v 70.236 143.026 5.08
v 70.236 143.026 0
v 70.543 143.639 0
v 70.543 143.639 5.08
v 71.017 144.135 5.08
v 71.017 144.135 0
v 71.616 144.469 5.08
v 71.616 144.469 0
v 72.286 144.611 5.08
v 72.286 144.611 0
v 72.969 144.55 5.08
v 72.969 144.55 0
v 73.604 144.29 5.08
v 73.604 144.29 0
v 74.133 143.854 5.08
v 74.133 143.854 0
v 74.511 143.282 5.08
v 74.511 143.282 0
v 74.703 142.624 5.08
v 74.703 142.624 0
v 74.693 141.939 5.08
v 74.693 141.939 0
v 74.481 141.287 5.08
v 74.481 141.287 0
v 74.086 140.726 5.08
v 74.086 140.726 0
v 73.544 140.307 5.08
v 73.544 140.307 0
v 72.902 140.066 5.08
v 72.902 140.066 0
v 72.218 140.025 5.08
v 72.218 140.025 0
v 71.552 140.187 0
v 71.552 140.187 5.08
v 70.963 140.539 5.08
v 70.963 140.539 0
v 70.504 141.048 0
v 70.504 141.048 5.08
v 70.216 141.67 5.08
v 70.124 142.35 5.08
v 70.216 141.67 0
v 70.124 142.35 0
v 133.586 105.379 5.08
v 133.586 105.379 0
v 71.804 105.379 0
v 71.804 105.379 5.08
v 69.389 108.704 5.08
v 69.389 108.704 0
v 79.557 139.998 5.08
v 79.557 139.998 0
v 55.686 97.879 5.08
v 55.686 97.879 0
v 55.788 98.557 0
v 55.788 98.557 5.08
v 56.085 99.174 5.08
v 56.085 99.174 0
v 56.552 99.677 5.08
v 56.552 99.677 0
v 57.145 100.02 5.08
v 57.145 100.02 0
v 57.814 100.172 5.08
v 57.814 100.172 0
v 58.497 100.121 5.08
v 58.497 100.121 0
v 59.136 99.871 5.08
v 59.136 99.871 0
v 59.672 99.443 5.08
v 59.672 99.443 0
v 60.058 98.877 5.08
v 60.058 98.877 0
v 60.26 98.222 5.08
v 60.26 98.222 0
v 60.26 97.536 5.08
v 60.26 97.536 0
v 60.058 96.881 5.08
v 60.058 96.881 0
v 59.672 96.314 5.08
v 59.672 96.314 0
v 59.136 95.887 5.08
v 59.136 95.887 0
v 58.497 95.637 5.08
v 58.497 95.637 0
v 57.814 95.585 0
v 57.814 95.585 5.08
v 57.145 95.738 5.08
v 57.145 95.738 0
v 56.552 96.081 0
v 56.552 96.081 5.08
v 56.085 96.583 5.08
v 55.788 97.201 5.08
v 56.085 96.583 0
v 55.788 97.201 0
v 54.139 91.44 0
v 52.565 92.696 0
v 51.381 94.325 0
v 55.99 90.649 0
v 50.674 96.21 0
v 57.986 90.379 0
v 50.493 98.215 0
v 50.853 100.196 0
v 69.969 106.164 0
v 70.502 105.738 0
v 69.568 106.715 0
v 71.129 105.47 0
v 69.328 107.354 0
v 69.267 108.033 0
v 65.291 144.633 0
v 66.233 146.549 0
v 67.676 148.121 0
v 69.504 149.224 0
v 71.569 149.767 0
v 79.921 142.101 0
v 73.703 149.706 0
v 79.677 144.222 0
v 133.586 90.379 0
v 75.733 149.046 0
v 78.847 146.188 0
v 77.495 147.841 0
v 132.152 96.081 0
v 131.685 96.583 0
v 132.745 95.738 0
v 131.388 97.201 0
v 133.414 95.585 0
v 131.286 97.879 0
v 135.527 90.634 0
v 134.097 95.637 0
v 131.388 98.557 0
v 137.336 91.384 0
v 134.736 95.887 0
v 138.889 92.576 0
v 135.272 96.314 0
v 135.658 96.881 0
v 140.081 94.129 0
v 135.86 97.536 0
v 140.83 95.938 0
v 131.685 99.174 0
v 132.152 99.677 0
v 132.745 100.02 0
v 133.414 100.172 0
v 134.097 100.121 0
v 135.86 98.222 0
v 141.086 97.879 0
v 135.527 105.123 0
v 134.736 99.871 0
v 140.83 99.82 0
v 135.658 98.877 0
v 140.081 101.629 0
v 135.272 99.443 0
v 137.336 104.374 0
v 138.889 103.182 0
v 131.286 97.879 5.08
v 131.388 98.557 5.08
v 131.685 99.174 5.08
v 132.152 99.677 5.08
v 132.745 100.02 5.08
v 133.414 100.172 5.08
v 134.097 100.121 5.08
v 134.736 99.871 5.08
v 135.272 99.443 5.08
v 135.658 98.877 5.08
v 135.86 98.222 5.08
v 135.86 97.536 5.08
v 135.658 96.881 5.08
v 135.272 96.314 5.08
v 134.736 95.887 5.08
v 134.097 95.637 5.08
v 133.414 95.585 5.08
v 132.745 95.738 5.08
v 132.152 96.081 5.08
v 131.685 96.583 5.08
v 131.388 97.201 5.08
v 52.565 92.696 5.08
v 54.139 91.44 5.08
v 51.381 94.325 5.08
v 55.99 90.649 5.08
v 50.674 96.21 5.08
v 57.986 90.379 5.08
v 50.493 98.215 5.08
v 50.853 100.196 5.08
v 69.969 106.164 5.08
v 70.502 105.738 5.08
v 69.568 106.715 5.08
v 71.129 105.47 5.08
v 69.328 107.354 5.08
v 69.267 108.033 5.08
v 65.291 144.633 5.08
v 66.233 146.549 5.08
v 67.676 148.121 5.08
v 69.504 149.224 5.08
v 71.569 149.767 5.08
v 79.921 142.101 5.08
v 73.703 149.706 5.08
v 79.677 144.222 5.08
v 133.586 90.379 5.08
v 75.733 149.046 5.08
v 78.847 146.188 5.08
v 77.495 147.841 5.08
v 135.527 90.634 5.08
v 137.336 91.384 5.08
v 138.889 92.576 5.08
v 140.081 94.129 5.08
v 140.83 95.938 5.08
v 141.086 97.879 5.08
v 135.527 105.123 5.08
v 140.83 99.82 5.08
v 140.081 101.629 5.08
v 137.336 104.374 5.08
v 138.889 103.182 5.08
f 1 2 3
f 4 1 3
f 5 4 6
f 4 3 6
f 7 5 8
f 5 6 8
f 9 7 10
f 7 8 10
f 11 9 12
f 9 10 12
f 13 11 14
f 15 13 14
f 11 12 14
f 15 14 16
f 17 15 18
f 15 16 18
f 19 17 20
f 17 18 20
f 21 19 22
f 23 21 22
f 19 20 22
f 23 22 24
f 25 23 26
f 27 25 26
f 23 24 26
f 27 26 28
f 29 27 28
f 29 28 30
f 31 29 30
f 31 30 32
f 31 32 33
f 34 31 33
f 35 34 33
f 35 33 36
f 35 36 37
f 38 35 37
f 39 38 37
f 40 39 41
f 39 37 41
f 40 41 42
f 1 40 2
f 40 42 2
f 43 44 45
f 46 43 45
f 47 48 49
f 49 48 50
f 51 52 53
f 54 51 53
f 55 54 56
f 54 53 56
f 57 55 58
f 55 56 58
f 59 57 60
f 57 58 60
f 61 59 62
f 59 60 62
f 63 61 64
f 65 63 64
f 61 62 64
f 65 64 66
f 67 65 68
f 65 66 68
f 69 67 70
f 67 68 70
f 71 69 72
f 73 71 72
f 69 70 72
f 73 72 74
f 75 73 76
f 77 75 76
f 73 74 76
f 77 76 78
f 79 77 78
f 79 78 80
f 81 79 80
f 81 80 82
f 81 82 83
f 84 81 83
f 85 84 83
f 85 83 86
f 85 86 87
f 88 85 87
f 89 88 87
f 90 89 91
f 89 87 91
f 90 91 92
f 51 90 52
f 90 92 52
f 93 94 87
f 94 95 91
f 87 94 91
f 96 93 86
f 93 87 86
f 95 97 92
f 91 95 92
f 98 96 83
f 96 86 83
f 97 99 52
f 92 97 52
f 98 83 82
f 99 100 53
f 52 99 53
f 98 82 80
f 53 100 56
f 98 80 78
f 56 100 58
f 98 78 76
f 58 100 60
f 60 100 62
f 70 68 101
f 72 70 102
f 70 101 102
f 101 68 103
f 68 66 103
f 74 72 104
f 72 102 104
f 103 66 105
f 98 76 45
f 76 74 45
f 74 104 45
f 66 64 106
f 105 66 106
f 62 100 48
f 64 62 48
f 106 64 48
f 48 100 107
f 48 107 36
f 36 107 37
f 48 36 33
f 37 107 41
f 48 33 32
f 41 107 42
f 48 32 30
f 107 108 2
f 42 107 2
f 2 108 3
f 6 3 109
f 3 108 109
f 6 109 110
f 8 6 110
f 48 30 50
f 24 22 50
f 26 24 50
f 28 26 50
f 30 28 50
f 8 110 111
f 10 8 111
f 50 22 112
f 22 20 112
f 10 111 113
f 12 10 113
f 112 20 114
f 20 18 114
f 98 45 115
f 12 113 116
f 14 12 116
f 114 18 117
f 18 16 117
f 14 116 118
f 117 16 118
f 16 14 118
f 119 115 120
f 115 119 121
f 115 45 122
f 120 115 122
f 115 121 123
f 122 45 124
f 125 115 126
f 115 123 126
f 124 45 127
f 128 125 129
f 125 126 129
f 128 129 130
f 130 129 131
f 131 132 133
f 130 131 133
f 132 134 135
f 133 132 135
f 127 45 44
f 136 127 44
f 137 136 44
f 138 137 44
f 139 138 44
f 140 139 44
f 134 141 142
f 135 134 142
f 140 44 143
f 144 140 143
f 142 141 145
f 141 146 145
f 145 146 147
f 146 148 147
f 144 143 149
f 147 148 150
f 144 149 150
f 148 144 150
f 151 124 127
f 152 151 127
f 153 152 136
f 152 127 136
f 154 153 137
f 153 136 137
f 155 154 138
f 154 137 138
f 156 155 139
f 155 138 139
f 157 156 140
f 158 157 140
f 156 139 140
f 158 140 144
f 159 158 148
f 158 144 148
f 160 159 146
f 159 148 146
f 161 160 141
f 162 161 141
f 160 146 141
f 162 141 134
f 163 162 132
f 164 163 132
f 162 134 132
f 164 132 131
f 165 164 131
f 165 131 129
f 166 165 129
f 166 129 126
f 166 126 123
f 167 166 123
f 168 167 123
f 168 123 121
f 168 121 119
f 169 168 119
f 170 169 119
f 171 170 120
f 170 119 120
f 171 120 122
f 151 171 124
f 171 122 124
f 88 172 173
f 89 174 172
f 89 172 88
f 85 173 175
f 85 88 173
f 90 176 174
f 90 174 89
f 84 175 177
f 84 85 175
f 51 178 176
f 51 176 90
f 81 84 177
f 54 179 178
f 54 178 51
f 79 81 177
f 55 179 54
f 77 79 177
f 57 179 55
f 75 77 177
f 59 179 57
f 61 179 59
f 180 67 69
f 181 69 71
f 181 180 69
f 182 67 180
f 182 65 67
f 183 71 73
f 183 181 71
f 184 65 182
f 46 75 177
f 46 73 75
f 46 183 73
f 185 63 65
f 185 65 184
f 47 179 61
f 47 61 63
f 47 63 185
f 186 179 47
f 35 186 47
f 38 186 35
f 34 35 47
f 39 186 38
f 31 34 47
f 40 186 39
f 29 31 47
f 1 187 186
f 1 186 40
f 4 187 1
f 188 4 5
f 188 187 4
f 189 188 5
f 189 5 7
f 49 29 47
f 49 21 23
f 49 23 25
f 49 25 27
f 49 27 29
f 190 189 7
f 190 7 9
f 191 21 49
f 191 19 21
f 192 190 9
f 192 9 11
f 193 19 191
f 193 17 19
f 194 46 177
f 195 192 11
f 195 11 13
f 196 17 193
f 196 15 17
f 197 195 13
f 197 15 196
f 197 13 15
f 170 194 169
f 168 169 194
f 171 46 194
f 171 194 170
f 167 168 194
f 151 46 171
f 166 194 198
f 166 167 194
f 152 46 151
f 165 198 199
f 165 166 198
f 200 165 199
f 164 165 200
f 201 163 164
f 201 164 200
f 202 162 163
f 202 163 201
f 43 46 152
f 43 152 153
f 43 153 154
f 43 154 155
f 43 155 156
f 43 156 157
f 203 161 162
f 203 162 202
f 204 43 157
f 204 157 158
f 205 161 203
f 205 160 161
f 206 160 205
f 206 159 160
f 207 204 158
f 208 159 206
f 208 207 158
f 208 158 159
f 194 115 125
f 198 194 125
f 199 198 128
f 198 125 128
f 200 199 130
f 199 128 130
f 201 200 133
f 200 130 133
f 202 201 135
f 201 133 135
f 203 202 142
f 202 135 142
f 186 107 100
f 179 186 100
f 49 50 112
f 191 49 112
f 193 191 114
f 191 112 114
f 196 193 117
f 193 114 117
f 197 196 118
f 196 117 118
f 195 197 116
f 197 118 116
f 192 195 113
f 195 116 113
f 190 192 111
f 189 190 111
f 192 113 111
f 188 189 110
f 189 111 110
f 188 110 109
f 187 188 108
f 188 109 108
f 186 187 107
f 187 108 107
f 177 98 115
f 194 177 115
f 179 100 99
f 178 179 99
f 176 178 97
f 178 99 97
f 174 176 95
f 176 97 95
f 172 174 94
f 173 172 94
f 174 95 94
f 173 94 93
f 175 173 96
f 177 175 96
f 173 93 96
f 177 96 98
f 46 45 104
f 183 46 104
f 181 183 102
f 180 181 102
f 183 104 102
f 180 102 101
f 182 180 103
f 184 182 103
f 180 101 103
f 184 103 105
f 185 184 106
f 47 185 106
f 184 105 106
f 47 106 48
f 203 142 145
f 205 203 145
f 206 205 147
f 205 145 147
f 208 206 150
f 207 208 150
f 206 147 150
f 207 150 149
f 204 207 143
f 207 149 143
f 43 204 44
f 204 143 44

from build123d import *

# Parameters (mm, degrees)
BOSS_EXTRUDE1_DEPTH = 5.08


with BuildPart() as part:
    # Sketch1 → Boss-Extrude1 (new body)
    with BuildSketch(Plane.XY):
        with BuildLine():
            ThreePointArc((50.8526553, 100.196470122), (51.917951715, 93.470453272), (57.985579172, 90.378842665))
            Line((57.985579172, 90.378842665), (133.585579172, 90.378842665))
            ThreePointArc((133.585579172, 90.378842665), (138.888880031, 92.575541806), (141.085579172, 97.878842665))
            ThreePointArc((141.085579172, 97.878842665), (138.888880031, 103.182143524), (133.585579172, 105.378842665))
            Line((133.585579172, 105.378842665), (71.804453654, 105.378842665))
            ThreePointArc((71.804453654, 105.378842665), (69.749550488, 106.425868124), (69.388770103, 108.70374583))
            Line((69.388770103, 108.70374583), (79.55681827, 139.99778028))
            ThreePointArc((79.55681827, 139.99778028), (74.741521855, 149.44833161), (65.290970525, 144.633035196))
            Line((65.290970525, 144.633035196), (50.8526553, 100.196470122))
        make_face()
        with BuildLine():
            ThreePointArc((60.285579172, 97.878842665), (57.985579172, 95.578842665), (55.685579172, 97.878842665))
            ThreePointArc((55.685579172, 97.878842665), (57.985579172, 100.178842665), (60.285579172, 97.878842665))
        make_face(mode=Mode.SUBTRACT)
        with BuildLine():
            ThreePointArc((135.885579172, 97.878842665), (133.585579172, 95.578842665), (131.285579172, 97.878842665))
            ThreePointArc((131.285579172, 97.878842665), (133.585579172, 100.178842665), (135.885579172, 97.878842665))
        make_face(mode=Mode.SUBTRACT)
        with BuildLine():
            ThreePointArc((74.611324385, 141.604668651), (71.713155311, 140.12797775), (70.23646441, 143.026146825))
            ThreePointArc((70.23646441, 143.026146825), (73.134633485, 144.502837725), (74.611324385, 141.604668651))
        make_face(mode=Mode.SUBTRACT)
    extrude(amount=BOSS_EXTRUDE1_DEPTH)


solid = part.part
